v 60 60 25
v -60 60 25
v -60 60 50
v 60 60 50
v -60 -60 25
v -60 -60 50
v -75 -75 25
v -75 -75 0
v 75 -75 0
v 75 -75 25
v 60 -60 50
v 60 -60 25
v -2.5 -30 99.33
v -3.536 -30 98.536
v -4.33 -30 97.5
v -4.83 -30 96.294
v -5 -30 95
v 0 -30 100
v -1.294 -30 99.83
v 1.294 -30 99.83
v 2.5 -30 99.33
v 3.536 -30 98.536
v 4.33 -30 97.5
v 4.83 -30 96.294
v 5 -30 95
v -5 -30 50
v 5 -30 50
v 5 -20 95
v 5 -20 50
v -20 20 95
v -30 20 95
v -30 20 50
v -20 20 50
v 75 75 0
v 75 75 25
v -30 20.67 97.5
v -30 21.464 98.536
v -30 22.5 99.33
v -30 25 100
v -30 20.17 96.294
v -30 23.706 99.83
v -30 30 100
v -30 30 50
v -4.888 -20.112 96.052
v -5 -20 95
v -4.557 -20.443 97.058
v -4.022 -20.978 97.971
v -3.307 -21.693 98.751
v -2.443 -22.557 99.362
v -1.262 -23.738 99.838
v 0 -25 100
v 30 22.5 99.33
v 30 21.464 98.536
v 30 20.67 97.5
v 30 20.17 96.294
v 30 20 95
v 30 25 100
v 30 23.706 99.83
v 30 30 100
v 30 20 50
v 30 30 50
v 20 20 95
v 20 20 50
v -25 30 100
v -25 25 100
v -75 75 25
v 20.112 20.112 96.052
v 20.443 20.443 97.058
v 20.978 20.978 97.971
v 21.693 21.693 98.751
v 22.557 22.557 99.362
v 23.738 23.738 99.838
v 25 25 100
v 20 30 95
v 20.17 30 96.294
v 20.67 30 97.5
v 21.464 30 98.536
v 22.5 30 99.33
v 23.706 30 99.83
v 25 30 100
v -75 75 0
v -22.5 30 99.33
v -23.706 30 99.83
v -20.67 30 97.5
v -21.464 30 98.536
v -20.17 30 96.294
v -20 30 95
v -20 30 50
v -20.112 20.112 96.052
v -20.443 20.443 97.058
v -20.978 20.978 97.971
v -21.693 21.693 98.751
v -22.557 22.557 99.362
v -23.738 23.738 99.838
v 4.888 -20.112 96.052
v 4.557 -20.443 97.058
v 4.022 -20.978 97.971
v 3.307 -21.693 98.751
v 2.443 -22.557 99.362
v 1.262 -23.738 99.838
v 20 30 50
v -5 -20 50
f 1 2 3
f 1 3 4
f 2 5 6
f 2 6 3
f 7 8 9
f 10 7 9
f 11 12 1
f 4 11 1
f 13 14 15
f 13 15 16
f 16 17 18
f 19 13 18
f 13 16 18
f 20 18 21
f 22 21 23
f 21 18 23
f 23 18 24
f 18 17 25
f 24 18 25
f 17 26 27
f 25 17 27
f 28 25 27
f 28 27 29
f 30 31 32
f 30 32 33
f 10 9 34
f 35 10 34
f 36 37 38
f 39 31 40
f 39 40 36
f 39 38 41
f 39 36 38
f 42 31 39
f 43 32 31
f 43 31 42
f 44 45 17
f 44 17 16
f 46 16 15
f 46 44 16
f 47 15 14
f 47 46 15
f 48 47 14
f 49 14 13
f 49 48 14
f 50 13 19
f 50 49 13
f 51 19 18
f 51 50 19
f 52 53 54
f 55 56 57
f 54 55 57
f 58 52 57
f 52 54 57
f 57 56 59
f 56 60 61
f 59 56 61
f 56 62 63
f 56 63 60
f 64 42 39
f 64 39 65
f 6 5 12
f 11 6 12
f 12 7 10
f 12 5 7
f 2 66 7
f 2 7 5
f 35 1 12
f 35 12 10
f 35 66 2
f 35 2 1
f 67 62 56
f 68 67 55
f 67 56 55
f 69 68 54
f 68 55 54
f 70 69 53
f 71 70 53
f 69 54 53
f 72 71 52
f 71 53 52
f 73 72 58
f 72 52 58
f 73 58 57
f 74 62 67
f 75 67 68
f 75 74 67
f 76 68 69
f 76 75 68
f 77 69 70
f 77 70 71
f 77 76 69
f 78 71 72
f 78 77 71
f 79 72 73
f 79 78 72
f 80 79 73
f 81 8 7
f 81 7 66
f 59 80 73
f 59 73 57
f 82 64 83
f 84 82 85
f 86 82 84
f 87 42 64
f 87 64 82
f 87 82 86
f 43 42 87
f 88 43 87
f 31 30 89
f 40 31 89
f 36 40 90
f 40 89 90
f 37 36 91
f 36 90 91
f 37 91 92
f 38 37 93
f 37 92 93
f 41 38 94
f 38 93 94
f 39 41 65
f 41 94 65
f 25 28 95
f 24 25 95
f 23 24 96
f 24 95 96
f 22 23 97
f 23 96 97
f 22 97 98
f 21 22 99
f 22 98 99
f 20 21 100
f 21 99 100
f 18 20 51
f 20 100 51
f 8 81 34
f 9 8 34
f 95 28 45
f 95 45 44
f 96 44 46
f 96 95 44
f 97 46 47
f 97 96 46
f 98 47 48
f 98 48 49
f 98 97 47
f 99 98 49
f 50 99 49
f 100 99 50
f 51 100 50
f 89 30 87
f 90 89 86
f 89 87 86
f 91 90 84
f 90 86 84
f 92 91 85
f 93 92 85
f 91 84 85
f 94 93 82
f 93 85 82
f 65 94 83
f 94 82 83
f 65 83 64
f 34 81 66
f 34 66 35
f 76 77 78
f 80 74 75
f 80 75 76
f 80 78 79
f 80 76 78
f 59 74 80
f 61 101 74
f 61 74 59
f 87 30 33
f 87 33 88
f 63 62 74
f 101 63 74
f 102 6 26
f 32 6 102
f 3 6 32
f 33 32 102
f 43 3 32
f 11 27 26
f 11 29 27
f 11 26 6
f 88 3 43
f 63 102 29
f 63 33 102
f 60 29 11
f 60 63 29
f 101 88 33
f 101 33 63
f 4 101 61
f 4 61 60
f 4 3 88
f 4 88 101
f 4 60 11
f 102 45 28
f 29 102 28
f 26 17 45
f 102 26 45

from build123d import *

# Parameters (mm, degrees)
F0_W     = 150
F0_H     = 150
F1_DEPTH = 25
F2_W     = 120
F2_H     = 120
F3_DEPTH = 25
F4_W     = 10
F4_H     = 10
F5_DEPTH = 50
F6_R     = 4.99999


# Not quite as in the source:
# - a fillet or chamfer is up to 0.001 mm smaller than in the source, because OpenCascade refuses the exact size


with BuildPart() as f1:
    # F0 (on Top) → F1 (new body)
    with BuildSketch(Plane.XY):
        Rectangle(F0_W, F0_H)
    extrude(amount=F1_DEPTH)

    # F2 (on face) → F3 (join)
    with BuildSketch(Plane.XY.offset(25)):
        Rectangle(F2_W, F2_H)
    extrude(amount=F3_DEPTH)

    # F4 (on face) → F5 (join)
    with BuildSketch(Plane.XY.offset(50)):
        with Locations((0, -25)):
            Rectangle(F4_W, F4_H)
        with Locations((-25, 25)):
            Rectangle(F4_W, F4_H)
        with Locations((25, 25)):
            Rectangle(F4_W, F4_H)
    extrude(amount=F5_DEPTH)

    # F6 (radius 5 in the source; OpenCascade refuses exactly that, so slightly less here)
    f6_edges = [f1.edges().sort_by_distance(p)[0] for p in [
        (-25, 20, 100),
        (-20, 25, 100),
        (25, 20, 100),
        (20, 25, 100),
        (-5, -25, 100),
        (0, -20, 100),
        (5, -25, 100),
    ]]
    fillet(f6_edges, radius=F6_R)


solid = f1.part
